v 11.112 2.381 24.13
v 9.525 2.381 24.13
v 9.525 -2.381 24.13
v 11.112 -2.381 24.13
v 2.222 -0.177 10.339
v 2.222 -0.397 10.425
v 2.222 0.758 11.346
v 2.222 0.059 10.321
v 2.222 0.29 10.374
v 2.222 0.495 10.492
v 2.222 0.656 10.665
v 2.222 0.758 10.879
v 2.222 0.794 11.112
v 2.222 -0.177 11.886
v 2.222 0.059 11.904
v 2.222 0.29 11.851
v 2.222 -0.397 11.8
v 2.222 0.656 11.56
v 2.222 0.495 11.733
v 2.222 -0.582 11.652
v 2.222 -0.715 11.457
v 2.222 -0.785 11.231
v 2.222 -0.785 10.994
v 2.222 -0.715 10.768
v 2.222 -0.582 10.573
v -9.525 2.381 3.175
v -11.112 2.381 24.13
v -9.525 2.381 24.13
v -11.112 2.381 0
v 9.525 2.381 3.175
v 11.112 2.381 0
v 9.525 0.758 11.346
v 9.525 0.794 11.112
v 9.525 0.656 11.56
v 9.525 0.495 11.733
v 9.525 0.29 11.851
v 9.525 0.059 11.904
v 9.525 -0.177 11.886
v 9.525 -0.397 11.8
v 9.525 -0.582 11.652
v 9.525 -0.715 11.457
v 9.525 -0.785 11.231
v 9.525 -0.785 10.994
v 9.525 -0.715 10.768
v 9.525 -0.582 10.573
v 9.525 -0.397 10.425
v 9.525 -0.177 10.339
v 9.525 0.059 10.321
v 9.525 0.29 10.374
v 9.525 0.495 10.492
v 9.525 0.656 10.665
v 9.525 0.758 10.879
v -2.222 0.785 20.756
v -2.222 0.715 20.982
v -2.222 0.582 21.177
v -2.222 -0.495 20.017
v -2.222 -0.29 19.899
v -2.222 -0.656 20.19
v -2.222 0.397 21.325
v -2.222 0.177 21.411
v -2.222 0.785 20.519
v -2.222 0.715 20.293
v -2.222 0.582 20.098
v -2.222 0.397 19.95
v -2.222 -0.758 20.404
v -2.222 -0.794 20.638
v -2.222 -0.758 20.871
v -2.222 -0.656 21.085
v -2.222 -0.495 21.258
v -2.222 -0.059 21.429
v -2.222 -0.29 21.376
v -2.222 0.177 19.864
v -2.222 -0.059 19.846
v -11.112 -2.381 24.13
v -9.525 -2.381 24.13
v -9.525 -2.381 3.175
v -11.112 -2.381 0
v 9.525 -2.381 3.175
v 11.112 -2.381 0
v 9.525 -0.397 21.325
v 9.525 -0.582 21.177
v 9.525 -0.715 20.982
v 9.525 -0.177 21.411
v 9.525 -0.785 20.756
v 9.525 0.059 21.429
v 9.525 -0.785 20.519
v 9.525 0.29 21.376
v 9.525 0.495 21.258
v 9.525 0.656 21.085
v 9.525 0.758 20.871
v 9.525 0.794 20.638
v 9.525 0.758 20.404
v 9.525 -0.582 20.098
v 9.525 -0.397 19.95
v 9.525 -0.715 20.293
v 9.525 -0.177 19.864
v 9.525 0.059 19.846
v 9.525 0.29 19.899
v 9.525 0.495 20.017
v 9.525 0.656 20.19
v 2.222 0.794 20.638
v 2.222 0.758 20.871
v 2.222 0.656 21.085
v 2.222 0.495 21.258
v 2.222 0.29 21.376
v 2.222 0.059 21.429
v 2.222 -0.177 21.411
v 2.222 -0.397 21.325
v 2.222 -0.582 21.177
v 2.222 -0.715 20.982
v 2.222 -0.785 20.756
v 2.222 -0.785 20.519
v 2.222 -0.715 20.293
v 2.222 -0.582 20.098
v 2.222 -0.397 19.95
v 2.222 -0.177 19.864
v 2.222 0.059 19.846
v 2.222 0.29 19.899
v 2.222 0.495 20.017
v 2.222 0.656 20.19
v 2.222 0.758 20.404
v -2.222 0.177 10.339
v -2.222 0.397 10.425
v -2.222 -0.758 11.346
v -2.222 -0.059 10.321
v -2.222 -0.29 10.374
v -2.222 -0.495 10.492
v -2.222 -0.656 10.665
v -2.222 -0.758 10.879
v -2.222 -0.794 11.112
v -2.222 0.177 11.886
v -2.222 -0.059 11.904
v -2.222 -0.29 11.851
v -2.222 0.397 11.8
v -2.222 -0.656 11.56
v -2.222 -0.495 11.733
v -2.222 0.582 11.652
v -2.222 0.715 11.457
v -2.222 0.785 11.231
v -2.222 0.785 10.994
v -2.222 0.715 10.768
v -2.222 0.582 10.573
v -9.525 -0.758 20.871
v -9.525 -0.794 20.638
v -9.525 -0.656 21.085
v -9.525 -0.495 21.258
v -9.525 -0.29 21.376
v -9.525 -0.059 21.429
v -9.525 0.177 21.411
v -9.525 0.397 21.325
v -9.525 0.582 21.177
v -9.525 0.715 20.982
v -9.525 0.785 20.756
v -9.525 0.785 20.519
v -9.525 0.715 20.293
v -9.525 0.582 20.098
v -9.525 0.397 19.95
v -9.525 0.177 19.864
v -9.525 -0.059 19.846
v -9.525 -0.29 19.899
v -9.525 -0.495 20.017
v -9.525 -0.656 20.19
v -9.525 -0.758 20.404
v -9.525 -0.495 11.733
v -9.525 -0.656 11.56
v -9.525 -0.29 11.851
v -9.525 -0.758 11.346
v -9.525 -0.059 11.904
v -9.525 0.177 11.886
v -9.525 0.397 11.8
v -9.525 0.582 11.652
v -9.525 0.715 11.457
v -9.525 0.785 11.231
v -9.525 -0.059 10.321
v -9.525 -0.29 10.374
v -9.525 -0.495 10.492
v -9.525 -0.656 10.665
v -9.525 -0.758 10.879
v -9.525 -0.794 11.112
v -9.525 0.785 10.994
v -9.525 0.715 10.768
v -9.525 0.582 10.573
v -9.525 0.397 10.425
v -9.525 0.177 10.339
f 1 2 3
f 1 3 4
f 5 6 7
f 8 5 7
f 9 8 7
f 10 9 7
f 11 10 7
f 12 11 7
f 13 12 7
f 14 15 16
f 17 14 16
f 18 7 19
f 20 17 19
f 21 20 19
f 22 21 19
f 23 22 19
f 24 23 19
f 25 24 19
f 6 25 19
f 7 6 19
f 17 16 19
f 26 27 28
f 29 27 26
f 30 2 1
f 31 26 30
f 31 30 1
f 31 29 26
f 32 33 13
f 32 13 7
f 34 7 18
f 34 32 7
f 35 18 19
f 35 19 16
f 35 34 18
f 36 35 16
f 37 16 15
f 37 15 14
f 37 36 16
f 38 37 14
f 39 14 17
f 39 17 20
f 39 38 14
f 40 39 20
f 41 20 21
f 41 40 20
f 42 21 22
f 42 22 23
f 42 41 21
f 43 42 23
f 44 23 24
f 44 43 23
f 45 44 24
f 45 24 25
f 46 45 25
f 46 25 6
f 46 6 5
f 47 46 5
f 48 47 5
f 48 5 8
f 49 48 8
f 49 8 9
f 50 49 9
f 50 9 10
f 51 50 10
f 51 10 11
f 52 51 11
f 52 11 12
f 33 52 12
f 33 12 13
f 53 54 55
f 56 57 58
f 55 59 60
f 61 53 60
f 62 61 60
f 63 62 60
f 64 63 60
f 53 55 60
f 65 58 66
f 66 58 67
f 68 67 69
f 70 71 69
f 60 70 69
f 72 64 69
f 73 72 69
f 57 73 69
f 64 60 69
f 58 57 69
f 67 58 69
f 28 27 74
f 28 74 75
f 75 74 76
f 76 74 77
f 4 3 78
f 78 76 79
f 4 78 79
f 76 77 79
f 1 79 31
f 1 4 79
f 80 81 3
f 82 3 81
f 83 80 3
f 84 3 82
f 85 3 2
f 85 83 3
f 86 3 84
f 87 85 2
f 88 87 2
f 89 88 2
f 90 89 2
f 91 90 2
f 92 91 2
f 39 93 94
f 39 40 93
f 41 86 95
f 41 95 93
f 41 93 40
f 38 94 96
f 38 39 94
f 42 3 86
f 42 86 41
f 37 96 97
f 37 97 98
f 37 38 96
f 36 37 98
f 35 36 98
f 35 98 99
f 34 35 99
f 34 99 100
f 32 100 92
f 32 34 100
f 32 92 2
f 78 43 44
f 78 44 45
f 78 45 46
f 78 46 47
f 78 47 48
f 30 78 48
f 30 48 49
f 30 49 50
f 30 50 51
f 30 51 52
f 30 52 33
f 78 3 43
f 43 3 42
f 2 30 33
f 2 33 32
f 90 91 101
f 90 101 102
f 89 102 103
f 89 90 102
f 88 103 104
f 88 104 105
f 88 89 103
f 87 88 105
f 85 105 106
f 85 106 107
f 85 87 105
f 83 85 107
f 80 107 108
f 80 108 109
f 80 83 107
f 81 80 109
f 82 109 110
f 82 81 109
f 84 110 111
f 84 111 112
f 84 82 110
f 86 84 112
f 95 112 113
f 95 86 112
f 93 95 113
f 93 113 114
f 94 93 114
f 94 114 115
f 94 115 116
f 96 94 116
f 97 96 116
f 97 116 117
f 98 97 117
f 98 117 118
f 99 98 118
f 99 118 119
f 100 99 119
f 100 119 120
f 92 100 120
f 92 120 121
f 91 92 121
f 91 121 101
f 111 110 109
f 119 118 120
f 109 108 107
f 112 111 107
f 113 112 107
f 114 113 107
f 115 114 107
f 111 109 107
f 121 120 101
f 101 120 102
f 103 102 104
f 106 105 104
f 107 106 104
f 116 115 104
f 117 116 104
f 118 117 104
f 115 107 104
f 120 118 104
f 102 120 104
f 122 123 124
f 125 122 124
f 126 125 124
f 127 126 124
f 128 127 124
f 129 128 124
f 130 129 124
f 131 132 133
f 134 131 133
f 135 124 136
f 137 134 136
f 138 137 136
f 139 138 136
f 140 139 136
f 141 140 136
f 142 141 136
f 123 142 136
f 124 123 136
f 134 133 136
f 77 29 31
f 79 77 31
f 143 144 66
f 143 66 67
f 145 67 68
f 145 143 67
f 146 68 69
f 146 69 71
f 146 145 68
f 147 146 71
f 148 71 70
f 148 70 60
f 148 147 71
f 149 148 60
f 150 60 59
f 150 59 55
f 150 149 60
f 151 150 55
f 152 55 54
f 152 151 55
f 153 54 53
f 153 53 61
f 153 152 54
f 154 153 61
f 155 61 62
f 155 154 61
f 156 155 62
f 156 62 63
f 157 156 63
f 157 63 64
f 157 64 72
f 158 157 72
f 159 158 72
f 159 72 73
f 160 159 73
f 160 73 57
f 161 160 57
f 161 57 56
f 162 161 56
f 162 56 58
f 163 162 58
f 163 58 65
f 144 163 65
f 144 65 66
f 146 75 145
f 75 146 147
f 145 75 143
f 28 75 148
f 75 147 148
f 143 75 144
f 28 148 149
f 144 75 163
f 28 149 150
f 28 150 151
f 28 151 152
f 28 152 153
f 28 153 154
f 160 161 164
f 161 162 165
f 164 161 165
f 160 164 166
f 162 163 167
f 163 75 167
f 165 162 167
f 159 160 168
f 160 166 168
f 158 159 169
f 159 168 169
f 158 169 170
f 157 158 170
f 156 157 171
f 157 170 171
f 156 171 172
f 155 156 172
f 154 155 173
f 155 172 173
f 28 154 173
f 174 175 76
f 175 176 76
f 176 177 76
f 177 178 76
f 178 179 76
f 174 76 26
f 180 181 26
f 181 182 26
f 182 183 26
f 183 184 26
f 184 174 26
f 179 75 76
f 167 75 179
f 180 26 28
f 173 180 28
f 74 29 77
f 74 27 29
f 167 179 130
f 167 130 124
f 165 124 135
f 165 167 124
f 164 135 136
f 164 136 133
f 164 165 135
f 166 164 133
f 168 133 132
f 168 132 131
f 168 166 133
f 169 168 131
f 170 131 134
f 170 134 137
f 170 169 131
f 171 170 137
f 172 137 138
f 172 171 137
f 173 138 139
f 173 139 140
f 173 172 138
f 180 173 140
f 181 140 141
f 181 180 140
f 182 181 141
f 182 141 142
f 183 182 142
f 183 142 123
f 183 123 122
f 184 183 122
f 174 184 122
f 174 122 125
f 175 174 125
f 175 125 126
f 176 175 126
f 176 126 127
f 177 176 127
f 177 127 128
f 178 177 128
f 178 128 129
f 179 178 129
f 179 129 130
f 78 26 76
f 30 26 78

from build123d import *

# Parameters (mm, degrees)
F0_W     = 1.5875
F0_H     = 4.7625
F1_DEPTH = 24.13
F0_W_2   = 19.05
F2_DEPTH = 3.175
F3_R     = 0.79375
F4_DEPTH = 8.89
F5_R     = 0.79375
F6_DEPTH = 8.89


with BuildPart() as f1:
    # F0 (on Top) → F1 (new body)
    with BuildSketch(Plane.XY):
        with Locations((-10.31875, 0)):
            Rectangle(F0_W, F0_H)
    extrude(amount=F1_DEPTH)



with BuildPart() as f1b:
    # F0 (on Top) → F1, piece 2 (new body)
    with BuildSketch(Plane.XY):
        with Locations((10.31875, 0)):
            Rectangle(F0_W, F0_H)
    extrude(amount=F1_DEPTH)


with BuildPart() as f1_1:
    add(f1.part)

    add(f1b.part)  # F2 merges F1b
    # F0 (on Top) → F2 (join)
    with BuildSketch(Plane.XY):
        with Locations((-10.31875, 0)):
            Rectangle(F0_W, F0_H)
        Rectangle(F0_W_2, F0_H)
        with Locations((10.31875, 0)):
            Rectangle(F0_W, F0_H)
    extrude(amount=F2_DEPTH)

    # F3 (on face) → F4 (join)
    with BuildSketch(Plane.YZ.offset(11.1125)):
        with Locations((0, 11.1125)):
            Circle(F3_R)
        with Locations((0, 20.6375)):
            Circle(F3_R)
    extrude(amount=-F4_DEPTH)

    # F5 (on face) → F6 (join)
    with BuildSketch(Plane(origin=(-11.1125, 0, 0), x_dir=(0, -1, 0), z_dir=(-1, 0, 0))):
        with Locations((0, 11.1125)):
            Circle(F5_R)
        with Locations((0, 20.6375)):
            Circle(F5_R)
    extrude(amount=-F6_DEPTH)


solid = f1_1.part
